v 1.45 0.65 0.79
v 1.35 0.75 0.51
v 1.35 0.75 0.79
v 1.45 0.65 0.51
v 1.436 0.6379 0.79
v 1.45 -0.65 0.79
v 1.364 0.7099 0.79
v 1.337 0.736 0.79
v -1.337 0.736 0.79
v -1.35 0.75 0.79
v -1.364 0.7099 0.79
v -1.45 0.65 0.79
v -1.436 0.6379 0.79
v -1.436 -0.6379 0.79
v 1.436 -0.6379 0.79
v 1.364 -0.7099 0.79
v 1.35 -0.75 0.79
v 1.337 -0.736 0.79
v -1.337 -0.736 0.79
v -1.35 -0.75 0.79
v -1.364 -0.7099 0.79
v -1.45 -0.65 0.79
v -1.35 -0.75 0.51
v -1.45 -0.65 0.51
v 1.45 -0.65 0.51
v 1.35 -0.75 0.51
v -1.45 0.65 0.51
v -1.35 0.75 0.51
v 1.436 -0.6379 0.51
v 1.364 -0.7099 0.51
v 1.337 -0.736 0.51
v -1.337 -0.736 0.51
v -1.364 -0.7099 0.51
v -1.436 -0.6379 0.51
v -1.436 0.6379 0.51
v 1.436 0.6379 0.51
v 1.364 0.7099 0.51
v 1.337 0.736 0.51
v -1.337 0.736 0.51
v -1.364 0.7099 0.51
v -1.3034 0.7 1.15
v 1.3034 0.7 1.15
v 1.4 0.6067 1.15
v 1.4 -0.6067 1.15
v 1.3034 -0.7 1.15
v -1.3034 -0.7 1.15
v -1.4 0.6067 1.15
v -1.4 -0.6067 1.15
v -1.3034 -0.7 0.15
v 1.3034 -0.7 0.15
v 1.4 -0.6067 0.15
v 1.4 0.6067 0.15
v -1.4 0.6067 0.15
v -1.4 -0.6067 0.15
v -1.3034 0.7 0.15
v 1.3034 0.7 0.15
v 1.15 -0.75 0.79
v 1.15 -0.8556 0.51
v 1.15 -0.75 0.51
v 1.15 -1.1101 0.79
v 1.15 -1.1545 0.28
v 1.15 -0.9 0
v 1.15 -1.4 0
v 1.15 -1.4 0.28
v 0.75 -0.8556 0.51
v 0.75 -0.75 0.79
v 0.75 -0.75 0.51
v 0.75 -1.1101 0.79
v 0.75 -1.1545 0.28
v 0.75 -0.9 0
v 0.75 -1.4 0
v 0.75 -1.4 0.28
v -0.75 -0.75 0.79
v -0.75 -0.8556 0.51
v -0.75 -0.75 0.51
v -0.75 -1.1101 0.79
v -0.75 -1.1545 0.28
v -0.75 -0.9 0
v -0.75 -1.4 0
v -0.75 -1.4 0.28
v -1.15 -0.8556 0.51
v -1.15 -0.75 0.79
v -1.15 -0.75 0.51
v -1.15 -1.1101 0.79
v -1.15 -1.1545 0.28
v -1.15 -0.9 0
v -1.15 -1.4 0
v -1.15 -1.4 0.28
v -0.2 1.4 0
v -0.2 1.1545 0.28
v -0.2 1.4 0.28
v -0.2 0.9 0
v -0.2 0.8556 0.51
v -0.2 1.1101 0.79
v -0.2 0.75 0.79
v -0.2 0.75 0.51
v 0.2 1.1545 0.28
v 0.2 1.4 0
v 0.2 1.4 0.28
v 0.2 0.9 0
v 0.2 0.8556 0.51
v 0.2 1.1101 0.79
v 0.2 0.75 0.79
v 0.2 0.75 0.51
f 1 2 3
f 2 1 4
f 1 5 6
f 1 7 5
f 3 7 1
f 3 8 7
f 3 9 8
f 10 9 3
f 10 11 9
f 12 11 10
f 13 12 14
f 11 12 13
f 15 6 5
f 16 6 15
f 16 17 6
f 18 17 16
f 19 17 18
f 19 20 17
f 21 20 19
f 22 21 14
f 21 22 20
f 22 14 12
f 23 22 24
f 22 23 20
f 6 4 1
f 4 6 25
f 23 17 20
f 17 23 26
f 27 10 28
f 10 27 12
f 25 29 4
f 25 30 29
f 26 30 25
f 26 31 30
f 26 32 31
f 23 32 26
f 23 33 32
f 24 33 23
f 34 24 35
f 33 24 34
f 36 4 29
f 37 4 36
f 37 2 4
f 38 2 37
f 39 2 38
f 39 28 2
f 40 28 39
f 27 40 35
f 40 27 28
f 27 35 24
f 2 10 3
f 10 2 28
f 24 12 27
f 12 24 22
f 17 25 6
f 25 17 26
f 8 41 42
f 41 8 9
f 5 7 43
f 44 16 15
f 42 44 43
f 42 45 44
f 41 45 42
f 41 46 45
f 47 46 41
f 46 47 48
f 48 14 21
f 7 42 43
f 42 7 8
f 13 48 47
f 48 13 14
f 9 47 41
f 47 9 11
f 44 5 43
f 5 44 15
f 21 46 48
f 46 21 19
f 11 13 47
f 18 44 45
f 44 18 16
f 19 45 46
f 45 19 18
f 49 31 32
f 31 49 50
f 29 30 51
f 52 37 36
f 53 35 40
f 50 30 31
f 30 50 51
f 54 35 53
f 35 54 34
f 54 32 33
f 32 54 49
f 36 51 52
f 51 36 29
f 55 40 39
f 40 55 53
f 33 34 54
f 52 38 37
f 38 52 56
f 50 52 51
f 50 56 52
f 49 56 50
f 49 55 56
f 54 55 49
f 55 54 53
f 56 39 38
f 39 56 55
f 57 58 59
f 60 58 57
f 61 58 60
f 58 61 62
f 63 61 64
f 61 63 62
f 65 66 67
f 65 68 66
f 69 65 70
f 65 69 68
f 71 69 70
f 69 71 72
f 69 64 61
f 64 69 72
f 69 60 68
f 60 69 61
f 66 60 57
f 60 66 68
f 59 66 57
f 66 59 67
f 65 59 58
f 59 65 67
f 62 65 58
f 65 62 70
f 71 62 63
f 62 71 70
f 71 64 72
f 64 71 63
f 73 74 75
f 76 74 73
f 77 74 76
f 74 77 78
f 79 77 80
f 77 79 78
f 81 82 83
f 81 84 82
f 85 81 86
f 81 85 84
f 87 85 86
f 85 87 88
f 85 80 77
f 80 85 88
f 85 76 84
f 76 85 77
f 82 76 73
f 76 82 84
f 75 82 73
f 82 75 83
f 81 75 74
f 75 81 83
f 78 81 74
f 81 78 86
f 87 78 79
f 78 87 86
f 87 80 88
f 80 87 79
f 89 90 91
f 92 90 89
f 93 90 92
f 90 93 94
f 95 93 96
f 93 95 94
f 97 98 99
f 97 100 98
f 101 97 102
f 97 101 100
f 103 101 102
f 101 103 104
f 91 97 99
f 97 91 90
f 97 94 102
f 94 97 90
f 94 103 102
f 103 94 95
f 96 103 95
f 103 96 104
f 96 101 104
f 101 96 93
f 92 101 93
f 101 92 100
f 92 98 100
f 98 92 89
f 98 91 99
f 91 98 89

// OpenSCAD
pin_pitch = 0.95;
pin_width = 0.4;
pin_seating = 0.5;
pin_gull_angle = 5;
leadframe_thickness = 0.28;

overall_width = 2.8;
body_width = 1.5;
body_length = 2.9;
body_thickness = 1;

total_thickness = 1.15;

body_length_bevel = 0.1;
body_width_bevel = 0.1;
body_chamfer = 0.1;


leadframe_height = total_thickness - body_thickness/2;

index_mark_offset = min(min(body_width, body_length) * 0.3, 1.5);
index_mark_radius = min(index_mark_offset / 3, 0.5);


//difference() {
    body();
//    color("#ddd") translate([
//        -body_length / 2 + index_mark_offset,
//        -body_width / 2 + index_mark_offset,
//        total_thickness - 0.1,
//    ]) cylinder(h = 10, r = index_mark_radius, $fn=32);
//}


rotate([0, 0, 180]) {
    translate([-pin_pitch, overall_width / 2, 0]) pin();
    translate([pin_pitch, overall_width / 2, 0]) pin();
}
translate([0, overall_width / 2, 0]) pin();


module pin() {
    color("#999") rotate([90, 0, 90]) linear_extrude(height = pin_width, center = true) {
        gull_offset = leadframe_height - leadframe_thickness / 2;
        pin_length = (overall_width - body_width) / 2;
        sine = sin(pin_gull_angle);
        cosine = cos(pin_gull_angle);
        polygon([
            [0, 0],
            [-pin_seating, 0],
            [-pin_seating - sine * gull_offset, gull_offset],
            [-pin_length, gull_offset],
            [-pin_length, gull_offset + leadframe_thickness],
            [-pin_seating - sine * (gull_offset + leadframe_thickness) + cosine * leadframe_thickness, gull_offset + leadframe_thickness],
            [-pin_seating - sine * leadframe_thickness + cosine * leadframe_thickness, leadframe_thickness],
            [0, leadframe_thickness],
        ]);
    }
}


module body() {
    color("#555") translate([0, 0, leadframe_height]) {
        linear_extrude(height = leadframe_thickness, center = true) body_outline();
        linear_extrude(
            height = body_thickness / 2,
            scale = [(body_length - body_length_bevel) / body_length, (body_width - body_width_bevel) / body_width]
        ) body_outline();
        
        rotate([180, 0, 0]) linear_extrude(
            height = body_thickness / 2,
            scale = [(body_length - body_length_bevel) / body_length, (body_width - body_width_bevel) / body_width]
        ) body_outline();
    }
}
module body_outline() {
    polygon([
        [ -body_length/2 + body_chamfer, -body_width/2 ],
        [ -body_length/2               , -body_width/2 + body_chamfer ],
        [ -body_length/2               , +body_width/2 - body_chamfer ],
        [ -body_length/2 + body_chamfer, +body_width/2 ],
        [ +body_length/2 - body_chamfer, +body_width/2 ],
        [ +body_length/2               , +body_width/2 - body_chamfer ],
        [ +body_length/2               , -body_width/2 + body_chamfer ],
        [ +body_length/2 - body_chamfer, -body_width/2 ],
    ]);
}
